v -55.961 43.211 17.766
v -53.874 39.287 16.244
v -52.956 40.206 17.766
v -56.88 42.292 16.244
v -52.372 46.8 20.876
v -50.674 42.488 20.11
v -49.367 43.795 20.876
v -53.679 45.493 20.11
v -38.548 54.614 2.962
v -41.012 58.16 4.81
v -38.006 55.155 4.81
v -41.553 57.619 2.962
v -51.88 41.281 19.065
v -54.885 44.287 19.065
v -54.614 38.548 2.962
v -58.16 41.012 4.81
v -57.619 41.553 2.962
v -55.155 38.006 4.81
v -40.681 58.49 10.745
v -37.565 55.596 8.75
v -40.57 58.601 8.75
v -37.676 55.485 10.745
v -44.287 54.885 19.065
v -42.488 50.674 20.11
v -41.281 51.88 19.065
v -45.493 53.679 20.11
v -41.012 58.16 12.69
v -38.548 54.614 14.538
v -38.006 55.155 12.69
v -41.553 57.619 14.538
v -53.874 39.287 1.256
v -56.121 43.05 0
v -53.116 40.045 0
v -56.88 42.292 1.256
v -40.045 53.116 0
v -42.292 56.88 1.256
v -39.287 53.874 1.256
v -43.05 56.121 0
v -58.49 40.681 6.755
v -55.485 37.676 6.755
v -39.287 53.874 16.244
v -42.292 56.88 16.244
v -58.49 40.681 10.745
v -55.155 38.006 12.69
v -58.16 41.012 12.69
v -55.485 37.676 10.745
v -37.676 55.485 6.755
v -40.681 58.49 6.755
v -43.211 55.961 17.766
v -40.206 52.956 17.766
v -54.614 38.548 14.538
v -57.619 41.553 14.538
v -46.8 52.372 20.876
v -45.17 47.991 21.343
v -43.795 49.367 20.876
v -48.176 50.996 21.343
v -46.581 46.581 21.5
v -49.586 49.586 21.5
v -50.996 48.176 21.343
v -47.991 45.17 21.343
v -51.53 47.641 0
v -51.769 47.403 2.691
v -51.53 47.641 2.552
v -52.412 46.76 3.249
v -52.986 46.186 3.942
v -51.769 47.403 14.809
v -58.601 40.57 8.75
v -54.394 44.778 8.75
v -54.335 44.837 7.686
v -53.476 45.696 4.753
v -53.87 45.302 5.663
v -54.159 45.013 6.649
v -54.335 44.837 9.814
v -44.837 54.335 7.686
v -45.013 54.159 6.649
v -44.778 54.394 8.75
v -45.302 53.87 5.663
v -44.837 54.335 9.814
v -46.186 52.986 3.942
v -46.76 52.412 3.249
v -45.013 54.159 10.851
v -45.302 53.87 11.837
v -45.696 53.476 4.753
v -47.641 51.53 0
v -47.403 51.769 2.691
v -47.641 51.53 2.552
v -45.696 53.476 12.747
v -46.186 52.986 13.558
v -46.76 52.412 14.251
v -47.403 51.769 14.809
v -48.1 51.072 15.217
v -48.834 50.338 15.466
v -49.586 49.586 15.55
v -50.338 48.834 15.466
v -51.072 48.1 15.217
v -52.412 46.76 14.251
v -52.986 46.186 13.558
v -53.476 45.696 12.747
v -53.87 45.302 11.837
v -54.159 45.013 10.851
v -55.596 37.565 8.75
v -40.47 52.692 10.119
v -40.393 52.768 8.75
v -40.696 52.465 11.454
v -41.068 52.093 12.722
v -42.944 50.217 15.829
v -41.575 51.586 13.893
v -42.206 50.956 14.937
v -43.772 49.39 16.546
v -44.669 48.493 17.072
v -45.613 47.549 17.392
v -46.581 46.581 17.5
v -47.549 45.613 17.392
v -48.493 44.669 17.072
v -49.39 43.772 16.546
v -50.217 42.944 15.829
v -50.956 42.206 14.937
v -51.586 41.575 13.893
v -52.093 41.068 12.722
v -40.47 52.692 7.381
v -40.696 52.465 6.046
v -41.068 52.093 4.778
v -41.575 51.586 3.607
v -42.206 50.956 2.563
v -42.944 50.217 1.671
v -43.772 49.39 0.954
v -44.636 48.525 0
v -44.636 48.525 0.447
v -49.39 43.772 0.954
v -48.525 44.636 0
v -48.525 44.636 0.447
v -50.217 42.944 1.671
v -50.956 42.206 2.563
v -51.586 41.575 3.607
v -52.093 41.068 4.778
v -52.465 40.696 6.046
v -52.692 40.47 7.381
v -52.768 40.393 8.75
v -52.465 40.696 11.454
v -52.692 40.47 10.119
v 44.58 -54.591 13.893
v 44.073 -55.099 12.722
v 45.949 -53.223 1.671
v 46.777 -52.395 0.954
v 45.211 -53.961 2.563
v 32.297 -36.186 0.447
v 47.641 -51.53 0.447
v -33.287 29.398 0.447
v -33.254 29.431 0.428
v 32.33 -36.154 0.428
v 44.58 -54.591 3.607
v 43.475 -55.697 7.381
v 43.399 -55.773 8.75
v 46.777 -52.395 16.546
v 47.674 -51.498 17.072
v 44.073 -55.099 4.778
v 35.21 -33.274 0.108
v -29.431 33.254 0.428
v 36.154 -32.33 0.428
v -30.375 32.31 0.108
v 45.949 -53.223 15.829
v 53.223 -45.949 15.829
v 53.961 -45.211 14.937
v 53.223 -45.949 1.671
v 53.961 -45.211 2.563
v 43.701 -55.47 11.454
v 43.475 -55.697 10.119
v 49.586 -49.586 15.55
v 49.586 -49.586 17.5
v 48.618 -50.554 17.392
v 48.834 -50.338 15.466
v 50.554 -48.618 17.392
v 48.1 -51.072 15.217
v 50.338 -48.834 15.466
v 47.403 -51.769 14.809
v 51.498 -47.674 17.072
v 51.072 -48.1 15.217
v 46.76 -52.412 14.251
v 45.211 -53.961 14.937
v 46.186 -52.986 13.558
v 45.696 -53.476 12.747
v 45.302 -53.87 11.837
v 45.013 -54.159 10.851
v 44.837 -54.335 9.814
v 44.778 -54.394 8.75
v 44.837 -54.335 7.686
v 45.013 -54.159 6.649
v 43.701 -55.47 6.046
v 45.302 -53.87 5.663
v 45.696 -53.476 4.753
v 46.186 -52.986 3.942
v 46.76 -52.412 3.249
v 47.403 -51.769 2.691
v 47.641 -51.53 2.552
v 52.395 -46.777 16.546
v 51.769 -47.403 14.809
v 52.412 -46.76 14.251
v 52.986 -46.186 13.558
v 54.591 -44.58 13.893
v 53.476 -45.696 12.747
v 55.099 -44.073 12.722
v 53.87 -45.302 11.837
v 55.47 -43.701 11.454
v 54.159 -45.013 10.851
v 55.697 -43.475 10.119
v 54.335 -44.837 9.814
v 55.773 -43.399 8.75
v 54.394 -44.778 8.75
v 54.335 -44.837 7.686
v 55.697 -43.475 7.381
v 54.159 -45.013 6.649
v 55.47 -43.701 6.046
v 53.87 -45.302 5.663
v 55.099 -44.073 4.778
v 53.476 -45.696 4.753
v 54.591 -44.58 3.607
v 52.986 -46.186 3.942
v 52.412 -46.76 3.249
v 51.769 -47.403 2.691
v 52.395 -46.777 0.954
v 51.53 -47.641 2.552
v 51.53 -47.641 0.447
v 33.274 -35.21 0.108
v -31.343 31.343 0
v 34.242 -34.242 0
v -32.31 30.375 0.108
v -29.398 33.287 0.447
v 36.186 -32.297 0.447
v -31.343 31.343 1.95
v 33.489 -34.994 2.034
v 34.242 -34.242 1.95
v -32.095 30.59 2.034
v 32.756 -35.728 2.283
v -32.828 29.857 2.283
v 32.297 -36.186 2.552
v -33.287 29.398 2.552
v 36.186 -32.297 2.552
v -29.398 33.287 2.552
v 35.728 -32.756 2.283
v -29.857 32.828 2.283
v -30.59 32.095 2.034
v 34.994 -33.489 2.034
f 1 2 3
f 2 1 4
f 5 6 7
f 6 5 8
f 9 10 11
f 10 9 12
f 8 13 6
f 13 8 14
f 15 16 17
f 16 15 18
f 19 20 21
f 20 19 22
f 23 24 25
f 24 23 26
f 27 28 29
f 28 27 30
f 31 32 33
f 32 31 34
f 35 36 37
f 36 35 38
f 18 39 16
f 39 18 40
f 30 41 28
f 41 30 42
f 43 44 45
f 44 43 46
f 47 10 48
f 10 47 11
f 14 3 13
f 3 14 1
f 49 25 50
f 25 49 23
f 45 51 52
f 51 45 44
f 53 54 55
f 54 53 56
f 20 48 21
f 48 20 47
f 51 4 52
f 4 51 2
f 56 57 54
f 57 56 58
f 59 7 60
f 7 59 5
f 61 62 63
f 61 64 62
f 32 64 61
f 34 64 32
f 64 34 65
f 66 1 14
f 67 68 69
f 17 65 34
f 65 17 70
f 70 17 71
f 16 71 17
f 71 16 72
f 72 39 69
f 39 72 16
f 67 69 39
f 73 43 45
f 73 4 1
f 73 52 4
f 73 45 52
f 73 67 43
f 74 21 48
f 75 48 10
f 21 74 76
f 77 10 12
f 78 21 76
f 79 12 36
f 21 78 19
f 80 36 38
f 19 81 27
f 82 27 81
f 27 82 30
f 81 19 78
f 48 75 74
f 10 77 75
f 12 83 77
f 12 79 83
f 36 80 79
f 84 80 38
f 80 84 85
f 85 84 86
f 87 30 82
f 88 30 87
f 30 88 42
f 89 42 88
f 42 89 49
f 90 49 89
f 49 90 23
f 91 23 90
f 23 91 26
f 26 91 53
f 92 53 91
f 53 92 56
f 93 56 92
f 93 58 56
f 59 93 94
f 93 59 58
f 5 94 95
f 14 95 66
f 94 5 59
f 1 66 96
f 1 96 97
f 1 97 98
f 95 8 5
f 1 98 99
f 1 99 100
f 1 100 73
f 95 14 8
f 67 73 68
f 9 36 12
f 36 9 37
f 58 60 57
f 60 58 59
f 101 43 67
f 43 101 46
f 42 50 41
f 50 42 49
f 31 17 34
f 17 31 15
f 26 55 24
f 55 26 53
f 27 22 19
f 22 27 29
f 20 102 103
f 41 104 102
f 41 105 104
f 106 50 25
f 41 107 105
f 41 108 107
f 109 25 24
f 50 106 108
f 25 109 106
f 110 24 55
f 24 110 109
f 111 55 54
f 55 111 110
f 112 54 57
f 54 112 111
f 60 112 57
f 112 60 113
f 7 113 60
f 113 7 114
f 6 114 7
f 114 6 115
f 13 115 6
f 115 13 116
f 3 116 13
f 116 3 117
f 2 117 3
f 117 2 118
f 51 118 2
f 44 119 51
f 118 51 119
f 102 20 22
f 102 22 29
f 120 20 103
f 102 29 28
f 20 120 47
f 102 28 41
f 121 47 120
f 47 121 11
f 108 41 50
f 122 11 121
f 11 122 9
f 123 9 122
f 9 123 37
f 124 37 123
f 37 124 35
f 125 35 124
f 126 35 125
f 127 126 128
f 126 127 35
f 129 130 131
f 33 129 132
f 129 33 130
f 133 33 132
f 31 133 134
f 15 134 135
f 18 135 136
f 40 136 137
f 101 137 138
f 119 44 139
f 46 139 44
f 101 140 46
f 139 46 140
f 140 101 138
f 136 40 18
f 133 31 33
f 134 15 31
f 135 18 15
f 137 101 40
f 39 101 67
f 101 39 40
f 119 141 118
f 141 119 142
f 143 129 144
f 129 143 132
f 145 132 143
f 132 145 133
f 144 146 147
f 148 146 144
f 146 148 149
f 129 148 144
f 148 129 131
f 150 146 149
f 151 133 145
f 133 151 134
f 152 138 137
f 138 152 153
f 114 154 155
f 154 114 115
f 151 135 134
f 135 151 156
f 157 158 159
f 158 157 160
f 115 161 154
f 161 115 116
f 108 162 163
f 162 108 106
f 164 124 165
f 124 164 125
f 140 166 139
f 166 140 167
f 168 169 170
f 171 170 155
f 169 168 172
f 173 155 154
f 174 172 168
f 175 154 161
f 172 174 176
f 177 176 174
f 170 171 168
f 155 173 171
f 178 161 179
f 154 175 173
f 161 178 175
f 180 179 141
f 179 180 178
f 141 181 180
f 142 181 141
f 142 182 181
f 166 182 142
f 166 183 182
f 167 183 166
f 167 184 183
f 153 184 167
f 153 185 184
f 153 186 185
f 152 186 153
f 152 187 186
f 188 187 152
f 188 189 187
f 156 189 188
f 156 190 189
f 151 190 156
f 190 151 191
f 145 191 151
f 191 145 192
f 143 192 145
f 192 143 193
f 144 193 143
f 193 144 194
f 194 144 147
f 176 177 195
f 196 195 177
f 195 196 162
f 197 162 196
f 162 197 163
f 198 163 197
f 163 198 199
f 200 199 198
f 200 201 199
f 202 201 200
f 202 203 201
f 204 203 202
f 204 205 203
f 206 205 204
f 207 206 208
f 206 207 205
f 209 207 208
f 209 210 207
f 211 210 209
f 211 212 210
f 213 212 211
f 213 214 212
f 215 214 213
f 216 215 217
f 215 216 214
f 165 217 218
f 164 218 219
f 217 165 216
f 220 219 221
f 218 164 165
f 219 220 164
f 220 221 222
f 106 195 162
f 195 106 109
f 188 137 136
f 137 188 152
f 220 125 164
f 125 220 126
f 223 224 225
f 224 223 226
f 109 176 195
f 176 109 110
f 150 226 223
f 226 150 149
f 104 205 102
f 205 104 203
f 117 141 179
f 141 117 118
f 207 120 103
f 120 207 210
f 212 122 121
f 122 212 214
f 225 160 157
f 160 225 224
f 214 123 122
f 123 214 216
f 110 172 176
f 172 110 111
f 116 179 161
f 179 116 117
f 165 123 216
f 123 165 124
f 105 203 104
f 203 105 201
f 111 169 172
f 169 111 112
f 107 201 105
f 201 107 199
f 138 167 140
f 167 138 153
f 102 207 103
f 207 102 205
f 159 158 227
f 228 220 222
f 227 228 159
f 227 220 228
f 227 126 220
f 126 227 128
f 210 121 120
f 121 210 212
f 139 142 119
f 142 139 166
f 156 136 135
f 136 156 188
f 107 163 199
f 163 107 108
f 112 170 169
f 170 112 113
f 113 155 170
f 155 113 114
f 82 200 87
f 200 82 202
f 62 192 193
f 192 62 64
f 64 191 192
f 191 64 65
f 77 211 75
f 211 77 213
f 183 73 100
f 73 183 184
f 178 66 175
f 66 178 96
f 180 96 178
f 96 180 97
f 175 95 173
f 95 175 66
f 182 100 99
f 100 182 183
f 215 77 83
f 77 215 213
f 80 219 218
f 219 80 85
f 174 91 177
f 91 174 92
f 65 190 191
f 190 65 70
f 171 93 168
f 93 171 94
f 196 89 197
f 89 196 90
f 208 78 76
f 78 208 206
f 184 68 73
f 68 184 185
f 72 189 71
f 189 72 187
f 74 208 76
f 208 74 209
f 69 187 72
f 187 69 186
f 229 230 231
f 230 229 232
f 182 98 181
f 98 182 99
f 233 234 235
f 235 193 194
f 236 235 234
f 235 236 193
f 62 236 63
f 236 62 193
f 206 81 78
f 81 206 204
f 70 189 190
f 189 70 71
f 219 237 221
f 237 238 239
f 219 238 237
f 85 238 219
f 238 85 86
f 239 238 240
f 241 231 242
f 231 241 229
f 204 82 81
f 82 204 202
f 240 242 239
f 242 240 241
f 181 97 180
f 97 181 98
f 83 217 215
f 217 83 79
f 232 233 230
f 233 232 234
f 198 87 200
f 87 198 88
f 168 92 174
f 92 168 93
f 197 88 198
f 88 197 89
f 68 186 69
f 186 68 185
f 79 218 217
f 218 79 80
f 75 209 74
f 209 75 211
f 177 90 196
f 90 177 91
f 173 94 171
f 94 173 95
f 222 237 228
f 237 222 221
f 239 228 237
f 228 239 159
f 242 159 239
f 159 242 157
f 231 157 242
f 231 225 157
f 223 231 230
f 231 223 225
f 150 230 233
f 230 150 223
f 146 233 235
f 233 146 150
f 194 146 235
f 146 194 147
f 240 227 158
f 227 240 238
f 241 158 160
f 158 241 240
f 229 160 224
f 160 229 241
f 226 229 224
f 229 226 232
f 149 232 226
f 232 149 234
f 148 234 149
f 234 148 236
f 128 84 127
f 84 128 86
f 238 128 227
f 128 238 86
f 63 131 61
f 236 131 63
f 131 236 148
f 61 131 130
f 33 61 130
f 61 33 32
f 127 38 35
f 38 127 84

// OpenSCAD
light_blue = [0.30, 0.45, 0.90, 0.85];
light_green = [0.30, 0.95, 0.40, 0.85];
arm_o_dia = 17.5;
arm_i_dia = 13.5;
arm_h     = 140.25;
spacing   = 5;
notch_l = 21.7;
smudge = 0.1;

//arm A
//  translate and rotate for show
//  translate( [ 16.25, 0, arm_h - notch_l + 4])
//  rotate([ 0, 180, -90])
//  translate(-[ -(arm_o_dia/2) - (spacing/2), 0, 0] )

/*
color( light_green )
translate([ -(arm_o_dia/2) - (spacing/2), 0, 0] )
arm_with_tab(arm_o_dia, arm_i_dia, arm_h/2, 0);
*/


//arm B
/*
color( light_blue )
translate([ (arm_o_dia/2) + (spacing/2) + 5, 0, 0] )
arm_with_notches(arm_o_dia, arm_i_dia, arm_h/2, 1);
*/

//arm A+B in one
color( light_blue )

rotate([ 0, 0, 45] )
translate([ 0, arm_h/2, 0] )
difference() {
translate([ 0, 0, arm_o_dia/2] )
rotate([ 90, 0, 0 ])
rotate([ 0, 0, -135 ])
arm_with_notches(arm_o_dia, arm_i_dia, arm_h, 1);

translate([ 0, 0, -arm_o_dia/4])
cube( [arm_h, arm_h, arm_o_dia/2], true);
}


module arm_bare(od, id, h) {
	difference() {
	cylinder(r=od/2, h=h, $fn=40);
	translate ([ 0, 0, -1])
	cylinder(r=id/2, h=h+2, $fn=40);
	}
}

module arm_with_notches(od, id, h, ring=0) {


	difference() {
		union() {
		if (ring) {
			arm_bare( 25.5, od -0.2, 4.25);
		}
		arm_bare(od, id + smudge, h);
		}

		bottom_notch( notch_l , h-notch_l);

		bottom_notch( notch_l + 4);

	}

}

module arm_with_tab(od, id, h, ring=0) {

	trans_l = 4;

	difference() {
		color([ .20, .30, .80, .70])
		union() {
		if (ring) {
			arm_bare( 25.5, od -0.2, 4.25);
		}

		arm_bare(od, id, h - notch_l);

		translate( [0, 0, h - notch_l] )
		arm_bare(id - smudge , id-3, notch_l);

		translate( [0, 0, h - notch_l - trans_l ] )
		difference() {
		cylinder(r1=(od-0.4)/2, r2=od/2, h=trans_l, $fn=20);
		translate( [0, 0, -0.1] )
		cylinder(r1=(od-0.4)/2, r2=(id-3)/2, h=trans_l+0.2, $fn=20);
		}
		}

		bottom_notch( notch_l + 4);
	}

		bottom_tab( notch_l , (h)-notch_l);
}

module bottom_tab(l, offset=0) {

	rotate([ 0, 0, 45])
	intersection() {
	translate([ 5.5, -2.75,  offset])
		cube( [ 3.3, 5.5, l  + 0.1] );
	translate([ 0, 0,  offset])
		cylinder( r=arm_o_dia/2, h=l, $fn=40);
	}
}

module bottom_notch(l, offset=0) {

	rotate([ 0, 0, 45])
	translate([ 5.5, -2.75,  offset])
	cube( [ 9, 5.5, l  + 0.1] );
}


//show_orig();

module show_orig() {
	color([ 0.85, 0.40, 0.45, 0.25])
	import(file="PL2Q_Hugin_arm_no_base_raft.stl");
}
